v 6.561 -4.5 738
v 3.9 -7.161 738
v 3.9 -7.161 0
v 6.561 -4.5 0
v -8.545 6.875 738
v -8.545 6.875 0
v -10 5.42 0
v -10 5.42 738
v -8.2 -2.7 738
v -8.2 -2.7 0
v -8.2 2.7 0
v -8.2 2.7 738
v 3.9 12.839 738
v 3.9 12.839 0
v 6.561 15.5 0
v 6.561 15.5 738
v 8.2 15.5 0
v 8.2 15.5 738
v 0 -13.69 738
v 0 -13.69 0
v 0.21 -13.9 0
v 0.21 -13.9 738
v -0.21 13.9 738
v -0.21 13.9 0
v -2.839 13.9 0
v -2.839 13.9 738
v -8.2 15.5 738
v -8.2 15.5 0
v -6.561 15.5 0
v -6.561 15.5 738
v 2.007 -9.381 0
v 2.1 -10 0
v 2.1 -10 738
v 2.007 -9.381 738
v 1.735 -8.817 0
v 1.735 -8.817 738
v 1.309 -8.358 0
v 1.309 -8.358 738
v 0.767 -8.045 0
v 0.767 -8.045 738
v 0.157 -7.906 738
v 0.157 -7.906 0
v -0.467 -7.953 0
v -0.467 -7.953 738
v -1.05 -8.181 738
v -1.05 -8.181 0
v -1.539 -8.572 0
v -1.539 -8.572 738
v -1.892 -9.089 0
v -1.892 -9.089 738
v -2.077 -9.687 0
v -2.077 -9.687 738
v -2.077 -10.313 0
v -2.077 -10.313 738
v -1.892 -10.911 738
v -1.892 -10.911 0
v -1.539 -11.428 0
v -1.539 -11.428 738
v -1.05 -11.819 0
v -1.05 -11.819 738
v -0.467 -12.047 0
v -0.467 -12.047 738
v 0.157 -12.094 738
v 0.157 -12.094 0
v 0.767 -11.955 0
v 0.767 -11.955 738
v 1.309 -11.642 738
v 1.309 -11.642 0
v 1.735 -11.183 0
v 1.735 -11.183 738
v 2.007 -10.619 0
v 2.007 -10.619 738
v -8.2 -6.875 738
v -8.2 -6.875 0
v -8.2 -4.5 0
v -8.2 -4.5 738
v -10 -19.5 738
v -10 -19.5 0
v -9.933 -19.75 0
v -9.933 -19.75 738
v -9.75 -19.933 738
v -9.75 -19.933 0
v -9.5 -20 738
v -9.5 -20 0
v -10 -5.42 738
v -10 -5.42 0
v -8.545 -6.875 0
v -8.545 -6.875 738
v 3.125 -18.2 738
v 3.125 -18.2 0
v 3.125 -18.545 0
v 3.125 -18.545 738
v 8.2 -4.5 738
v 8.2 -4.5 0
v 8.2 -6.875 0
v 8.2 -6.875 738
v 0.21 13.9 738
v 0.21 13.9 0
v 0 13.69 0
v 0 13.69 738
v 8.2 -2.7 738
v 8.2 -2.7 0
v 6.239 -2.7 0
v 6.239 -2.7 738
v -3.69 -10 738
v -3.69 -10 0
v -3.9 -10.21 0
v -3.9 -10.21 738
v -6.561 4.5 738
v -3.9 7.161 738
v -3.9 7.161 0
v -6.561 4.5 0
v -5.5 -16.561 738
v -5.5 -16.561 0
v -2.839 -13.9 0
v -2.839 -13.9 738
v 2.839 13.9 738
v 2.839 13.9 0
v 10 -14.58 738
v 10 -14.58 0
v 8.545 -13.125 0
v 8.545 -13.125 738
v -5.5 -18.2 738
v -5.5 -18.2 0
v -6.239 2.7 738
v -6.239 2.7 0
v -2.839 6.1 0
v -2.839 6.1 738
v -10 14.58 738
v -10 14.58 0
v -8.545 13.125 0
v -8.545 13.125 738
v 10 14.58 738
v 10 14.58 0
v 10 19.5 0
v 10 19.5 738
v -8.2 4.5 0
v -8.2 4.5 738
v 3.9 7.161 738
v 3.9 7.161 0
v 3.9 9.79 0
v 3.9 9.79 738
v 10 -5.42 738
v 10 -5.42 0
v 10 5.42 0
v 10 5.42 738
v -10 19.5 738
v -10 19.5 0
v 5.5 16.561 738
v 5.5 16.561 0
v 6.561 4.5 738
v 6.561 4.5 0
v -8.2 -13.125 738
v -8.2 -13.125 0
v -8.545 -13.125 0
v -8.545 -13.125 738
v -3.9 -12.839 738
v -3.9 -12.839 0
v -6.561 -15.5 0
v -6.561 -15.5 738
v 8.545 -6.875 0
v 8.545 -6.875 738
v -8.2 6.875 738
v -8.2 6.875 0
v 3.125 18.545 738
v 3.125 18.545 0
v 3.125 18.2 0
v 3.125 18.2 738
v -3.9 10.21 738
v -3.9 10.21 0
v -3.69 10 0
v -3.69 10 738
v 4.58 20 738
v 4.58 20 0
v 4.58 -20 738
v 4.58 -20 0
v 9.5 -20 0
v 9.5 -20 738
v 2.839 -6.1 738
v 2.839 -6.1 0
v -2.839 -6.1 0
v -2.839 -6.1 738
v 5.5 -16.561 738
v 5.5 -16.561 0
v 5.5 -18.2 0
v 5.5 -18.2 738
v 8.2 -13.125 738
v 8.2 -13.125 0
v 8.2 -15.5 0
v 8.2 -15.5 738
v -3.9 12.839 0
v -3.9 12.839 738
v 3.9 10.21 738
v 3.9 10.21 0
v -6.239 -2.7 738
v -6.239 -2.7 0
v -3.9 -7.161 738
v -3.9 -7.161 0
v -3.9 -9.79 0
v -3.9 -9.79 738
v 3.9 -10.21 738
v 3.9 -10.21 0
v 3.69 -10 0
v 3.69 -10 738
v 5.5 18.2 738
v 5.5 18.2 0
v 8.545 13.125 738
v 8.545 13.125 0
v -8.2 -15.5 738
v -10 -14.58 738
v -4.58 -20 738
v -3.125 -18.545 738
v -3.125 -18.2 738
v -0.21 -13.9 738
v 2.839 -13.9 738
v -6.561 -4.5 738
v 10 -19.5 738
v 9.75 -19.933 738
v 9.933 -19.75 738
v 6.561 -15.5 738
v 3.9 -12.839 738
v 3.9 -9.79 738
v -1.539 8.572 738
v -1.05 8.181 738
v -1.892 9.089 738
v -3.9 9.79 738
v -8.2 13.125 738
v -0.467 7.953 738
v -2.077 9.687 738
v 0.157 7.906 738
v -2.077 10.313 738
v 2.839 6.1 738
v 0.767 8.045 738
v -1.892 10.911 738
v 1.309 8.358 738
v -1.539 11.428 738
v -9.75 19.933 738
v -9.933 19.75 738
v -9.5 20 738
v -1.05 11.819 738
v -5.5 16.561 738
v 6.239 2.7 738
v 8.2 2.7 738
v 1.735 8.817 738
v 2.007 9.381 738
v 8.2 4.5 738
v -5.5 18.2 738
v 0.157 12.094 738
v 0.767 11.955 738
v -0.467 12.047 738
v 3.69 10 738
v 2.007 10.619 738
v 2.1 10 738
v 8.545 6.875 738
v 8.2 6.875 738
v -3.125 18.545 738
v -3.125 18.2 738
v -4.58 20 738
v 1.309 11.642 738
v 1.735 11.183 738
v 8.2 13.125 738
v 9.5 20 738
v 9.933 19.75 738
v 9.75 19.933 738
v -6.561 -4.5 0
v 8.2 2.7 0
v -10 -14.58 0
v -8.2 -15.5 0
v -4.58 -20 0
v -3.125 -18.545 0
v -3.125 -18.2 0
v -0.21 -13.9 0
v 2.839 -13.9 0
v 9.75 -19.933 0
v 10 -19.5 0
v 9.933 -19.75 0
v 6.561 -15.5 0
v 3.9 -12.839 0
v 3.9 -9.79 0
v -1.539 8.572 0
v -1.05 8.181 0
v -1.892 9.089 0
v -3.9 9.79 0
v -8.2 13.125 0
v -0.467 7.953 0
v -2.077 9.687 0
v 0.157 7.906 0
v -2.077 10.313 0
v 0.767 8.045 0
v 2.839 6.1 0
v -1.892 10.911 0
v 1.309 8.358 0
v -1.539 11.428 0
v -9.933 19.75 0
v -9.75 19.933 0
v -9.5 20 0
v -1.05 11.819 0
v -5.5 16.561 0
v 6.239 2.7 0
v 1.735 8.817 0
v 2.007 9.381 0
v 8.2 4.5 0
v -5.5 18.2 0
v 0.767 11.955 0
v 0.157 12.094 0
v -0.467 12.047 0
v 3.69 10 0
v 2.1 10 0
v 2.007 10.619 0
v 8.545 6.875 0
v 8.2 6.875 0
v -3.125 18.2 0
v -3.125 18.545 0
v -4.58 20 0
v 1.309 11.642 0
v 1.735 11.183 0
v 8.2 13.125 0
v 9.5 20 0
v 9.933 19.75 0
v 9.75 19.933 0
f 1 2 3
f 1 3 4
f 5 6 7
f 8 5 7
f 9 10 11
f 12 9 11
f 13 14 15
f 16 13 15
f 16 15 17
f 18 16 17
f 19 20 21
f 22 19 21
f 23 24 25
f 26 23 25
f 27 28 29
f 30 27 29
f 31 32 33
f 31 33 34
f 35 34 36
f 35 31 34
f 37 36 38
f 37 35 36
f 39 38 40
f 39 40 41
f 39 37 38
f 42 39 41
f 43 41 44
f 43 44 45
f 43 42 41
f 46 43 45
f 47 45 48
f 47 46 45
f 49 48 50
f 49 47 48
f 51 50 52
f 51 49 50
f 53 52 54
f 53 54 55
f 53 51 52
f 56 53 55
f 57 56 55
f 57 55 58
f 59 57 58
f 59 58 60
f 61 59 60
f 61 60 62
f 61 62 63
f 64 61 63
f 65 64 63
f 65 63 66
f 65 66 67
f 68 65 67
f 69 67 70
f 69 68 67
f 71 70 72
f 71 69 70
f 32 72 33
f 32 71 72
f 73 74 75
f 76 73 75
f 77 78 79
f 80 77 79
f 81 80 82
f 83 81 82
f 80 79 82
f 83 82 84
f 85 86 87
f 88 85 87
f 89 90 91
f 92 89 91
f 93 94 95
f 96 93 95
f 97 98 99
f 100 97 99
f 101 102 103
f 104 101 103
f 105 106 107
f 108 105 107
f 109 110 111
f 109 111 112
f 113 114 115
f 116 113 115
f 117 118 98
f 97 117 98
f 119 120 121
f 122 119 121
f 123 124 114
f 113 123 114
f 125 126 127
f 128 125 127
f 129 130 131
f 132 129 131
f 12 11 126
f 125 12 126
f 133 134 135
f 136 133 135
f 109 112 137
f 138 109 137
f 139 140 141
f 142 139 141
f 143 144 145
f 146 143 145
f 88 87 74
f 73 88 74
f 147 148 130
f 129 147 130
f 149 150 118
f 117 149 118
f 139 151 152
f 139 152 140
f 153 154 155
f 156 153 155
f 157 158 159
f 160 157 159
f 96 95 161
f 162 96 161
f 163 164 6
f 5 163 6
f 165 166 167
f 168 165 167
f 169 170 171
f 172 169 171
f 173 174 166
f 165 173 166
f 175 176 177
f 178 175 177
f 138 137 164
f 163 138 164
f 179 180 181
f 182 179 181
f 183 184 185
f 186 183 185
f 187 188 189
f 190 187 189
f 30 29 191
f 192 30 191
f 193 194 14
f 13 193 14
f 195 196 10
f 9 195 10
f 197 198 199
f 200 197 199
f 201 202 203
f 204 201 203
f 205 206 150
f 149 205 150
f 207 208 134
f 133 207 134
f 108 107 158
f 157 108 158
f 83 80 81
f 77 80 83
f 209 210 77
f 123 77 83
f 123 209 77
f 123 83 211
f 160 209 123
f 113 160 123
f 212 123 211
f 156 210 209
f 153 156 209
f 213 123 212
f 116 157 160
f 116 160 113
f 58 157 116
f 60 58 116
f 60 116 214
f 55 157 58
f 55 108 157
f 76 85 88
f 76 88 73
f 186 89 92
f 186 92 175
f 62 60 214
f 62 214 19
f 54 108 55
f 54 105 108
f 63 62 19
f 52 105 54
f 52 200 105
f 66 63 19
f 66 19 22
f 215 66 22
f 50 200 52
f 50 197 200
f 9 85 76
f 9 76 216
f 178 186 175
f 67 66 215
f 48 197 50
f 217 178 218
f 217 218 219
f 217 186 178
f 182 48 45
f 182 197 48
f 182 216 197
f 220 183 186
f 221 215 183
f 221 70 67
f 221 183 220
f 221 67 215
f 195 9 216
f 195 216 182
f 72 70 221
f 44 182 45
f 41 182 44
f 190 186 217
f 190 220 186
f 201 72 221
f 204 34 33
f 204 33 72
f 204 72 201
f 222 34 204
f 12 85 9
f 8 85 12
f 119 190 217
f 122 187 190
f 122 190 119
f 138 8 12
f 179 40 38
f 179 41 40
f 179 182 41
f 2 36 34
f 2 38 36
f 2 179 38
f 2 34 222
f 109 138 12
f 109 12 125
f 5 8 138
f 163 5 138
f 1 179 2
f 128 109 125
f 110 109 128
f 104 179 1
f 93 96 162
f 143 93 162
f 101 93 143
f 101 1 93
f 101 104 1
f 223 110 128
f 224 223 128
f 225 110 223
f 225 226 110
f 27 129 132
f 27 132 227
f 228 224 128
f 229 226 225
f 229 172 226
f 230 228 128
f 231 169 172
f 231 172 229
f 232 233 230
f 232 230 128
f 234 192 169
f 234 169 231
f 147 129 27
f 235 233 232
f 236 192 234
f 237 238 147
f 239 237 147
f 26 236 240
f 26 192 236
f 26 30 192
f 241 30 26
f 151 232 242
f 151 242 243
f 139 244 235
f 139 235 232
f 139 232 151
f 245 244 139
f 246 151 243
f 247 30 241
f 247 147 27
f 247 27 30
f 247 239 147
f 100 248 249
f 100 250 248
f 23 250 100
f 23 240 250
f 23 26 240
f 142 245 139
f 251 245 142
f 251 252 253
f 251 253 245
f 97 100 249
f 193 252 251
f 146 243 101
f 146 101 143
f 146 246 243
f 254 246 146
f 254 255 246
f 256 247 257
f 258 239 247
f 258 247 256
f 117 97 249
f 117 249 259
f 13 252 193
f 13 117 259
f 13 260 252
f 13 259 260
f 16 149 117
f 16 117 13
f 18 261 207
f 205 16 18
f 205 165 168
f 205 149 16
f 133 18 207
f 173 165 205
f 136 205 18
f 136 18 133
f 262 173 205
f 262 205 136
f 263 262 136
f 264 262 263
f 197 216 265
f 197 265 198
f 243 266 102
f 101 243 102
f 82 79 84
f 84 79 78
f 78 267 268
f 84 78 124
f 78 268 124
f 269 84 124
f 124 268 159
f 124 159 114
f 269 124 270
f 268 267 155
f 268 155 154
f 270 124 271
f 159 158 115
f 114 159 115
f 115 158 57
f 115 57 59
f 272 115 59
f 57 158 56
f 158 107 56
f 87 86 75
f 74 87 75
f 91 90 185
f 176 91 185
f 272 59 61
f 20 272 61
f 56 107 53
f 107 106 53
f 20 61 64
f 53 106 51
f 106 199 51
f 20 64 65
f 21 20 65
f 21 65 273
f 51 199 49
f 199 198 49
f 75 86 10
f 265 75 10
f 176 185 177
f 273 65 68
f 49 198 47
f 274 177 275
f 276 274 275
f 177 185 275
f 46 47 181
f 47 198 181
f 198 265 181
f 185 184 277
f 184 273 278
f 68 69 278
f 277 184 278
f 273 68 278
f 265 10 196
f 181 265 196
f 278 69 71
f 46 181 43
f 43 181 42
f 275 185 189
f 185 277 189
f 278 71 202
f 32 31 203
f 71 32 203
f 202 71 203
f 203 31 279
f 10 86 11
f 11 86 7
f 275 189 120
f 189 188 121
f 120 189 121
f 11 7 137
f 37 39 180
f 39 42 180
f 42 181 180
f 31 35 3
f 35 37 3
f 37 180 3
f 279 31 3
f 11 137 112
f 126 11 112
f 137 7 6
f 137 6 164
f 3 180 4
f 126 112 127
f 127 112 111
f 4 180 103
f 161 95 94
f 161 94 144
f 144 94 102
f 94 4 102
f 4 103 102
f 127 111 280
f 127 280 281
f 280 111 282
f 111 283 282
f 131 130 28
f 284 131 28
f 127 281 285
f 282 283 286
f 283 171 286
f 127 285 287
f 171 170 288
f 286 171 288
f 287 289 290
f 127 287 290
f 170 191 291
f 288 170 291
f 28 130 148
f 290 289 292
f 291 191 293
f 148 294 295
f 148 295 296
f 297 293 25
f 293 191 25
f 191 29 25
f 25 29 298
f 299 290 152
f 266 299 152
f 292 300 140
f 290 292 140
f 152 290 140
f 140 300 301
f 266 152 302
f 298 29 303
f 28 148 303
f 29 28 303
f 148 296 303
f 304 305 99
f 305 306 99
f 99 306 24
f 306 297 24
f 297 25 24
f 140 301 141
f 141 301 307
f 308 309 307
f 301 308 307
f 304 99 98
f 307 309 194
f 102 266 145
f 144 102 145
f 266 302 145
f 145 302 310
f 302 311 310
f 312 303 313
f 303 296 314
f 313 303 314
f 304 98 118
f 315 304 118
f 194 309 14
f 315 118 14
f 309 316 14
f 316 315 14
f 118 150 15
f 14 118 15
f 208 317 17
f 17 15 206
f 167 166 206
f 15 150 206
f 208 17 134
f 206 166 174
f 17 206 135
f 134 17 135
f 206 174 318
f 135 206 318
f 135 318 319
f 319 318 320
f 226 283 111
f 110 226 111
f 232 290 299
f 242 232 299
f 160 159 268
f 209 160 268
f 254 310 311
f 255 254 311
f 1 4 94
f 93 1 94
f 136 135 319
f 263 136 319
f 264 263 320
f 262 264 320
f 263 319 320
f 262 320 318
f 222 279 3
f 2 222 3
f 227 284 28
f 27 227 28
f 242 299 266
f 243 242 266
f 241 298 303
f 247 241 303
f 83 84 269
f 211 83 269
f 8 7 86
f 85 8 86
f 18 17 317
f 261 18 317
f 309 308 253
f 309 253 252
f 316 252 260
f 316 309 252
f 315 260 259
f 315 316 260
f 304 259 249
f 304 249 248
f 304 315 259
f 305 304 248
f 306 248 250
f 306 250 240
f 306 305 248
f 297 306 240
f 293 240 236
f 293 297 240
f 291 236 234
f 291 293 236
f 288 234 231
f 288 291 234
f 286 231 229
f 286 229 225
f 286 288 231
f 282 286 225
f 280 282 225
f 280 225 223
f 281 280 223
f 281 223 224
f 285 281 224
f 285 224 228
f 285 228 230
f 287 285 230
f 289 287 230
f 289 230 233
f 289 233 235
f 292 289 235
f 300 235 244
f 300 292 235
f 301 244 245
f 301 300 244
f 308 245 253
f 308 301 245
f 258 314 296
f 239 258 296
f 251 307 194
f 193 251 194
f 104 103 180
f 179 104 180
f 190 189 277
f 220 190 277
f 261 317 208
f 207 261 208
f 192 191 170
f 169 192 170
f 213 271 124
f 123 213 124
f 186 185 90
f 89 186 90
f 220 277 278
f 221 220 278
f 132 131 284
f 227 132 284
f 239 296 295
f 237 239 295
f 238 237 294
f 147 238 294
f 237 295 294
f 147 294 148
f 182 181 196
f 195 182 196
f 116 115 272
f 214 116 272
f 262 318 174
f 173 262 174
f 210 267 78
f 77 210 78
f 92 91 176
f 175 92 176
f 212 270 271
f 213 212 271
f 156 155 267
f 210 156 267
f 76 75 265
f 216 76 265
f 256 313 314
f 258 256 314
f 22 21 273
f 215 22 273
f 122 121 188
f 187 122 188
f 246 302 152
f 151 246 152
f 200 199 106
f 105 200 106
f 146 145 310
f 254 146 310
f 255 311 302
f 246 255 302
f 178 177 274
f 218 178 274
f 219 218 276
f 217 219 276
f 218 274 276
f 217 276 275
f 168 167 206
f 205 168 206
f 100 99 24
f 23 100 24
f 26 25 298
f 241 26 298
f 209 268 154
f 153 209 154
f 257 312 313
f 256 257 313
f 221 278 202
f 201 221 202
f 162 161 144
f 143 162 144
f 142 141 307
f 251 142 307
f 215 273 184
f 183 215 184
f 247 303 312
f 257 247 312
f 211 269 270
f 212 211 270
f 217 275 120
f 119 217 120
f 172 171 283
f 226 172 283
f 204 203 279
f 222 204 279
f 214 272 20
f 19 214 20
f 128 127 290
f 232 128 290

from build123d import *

# Parameters (mm, degrees)
SKETCH1_R           = 2.1
BOSS_EXTRUDE1_DEPTH = 738


with BuildPart() as part:
    # Sketch1 → Boss-Extrude1 (new body)
    with BuildSketch(Plane.XY):
        with BuildLine():
            Line((4.58, -20), (9.5, -20))
            ThreePointArc((9.5, -20), (9.853553391, -19.853553391), (10, -19.5))
            Line((10, -19.5), (10, -14.58))
            Line((10, -14.58), (8.545, -13.125))
            Line((8.545, -13.125), (8.2, -13.125))
            Line((8.2, -13.125), (8.2, -15.5))
            Line((8.2, -15.5), (6.560660172, -15.5))
            Line((6.560660172, -15.5), (3.9, -12.839339828))
            Line((3.9, -12.839339828), (3.9, -10.21))
            Line((3.9, -10.21), (3.69, -10))
            Line((3.69, -10), (3.9, -9.79))
            Line((3.9, -9.79), (3.9, -7.160660172))
            Line((3.9, -7.160660172), (6.560660172, -4.5))
            Line((6.560660172, -4.5), (8.2, -4.5))
            Line((8.2, -4.5), (8.2, -6.875))
            Line((8.2, -6.875), (8.545, -6.875))
            Line((8.545, -6.875), (10, -5.42))
            Line((10, -5.42), (10, 5.42))
            Line((10, 5.42), (8.545, 6.875))
            Line((8.545, 6.875), (8.2, 6.875))
            Line((8.2, 6.875), (8.2, 4.5))
            Line((8.2, 4.5), (6.560660172, 4.5))
            Line((6.560660172, 4.5), (3.9, 7.160660172))
            Line((3.9, 7.160660172), (3.9, 9.79))
            Line((3.9, 9.79), (3.69, 10))
            Line((3.69, 10), (3.9, 10.21))
            Line((3.9, 10.21), (3.9, 12.839339828))
            Line((3.9, 12.839339828), (6.560660172, 15.5))
            Line((6.560660172, 15.5), (8.2, 15.5))
            Line((8.2, 15.5), (8.2, 13.125))
            Line((8.2, 13.125), (8.545, 13.125))
            Line((8.545, 13.125), (10, 14.58))
            Line((10, 14.58), (10, 19.5))
            ThreePointArc((10, 19.5), (9.853553391, 19.853553391), (9.5, 20))
            Line((9.5, 20), (4.58, 20))
            Line((4.58, 20), (3.125, 18.545))
            Line((3.125, 18.545), (3.125, 18.2))
            Line((3.125, 18.2), (5.5, 18.2))
            Line((5.5, 18.2), (5.5, 16.560660172))
            Line((5.5, 16.560660172), (2.839339828, 13.9))
            Line((2.839339828, 13.9), (0.21, 13.9))
            Line((0.21, 13.9), (0, 13.69))
            Line((0, 13.69), (-0.21, 13.9))
            Line((-0.21, 13.9), (-2.839339828, 13.9))
            Line((-2.839339828, 13.9), (-5.5, 16.560660172))
            Line((-5.5, 16.560660172), (-5.5, 18.2))
            Line((-5.5, 18.2), (-3.125, 18.2))
            Line((-3.125, 18.2), (-3.125, 18.545))
            Line((-3.125, 18.545), (-4.58, 20))
            Line((-4.58, 20), (-9.5, 20))
            ThreePointArc((-9.5, 20), (-9.853553391, 19.853553391), (-10, 19.5))
            Line((-10, 19.5), (-10, 14.58))
            Line((-10, 14.58), (-8.545, 13.125))
            Line((-8.545, 13.125), (-8.2, 13.125))
            Line((-8.2, 13.125), (-8.2, 15.5))
            Line((-8.2, 15.5), (-6.560660172, 15.5))
            Line((-6.560660172, 15.5), (-3.9, 12.839339828))
            Line((-3.9, 12.839339828), (-3.9, 10.21))
            Line((-3.9, 10.21), (-3.69, 10))
            Line((-3.69, 10), (-3.9, 9.79))
            Line((-3.9, 9.79), (-3.9, 7.160660172))
            Line((-3.9, 7.160660172), (-6.560660172, 4.5))
            Line((-6.560660172, 4.5), (-8.2, 4.5))
            Line((-8.2, 4.5), (-8.2, 6.875))
            Line((-8.2, 6.875), (-8.545, 6.875))
            Line((-8.545, 6.875), (-10, 5.42))
            Line((-10, 5.42), (-10, -5.42))
            Line((-10, -5.42), (-8.545, -6.875))
            Line((-8.545, -6.875), (-8.2, -6.875))
            Line((-8.2, -6.875), (-8.2, -4.5))
            Line((-8.2, -4.5), (-6.560660172, -4.5))
            Line((-6.560660172, -4.5), (-3.9, -7.160660172))
            Line((-3.9, -7.160660172), (-3.9, -9.79))
            Line((-3.9, -9.79), (-3.69, -10))
            Line((-3.69, -10), (-3.9, -10.21))
            Line((-3.9, -10.21), (-3.9, -12.839339828))
            Line((-3.9, -12.839339828), (-6.560660172, -15.5))
            Line((-6.560660172, -15.5), (-8.2, -15.5))
            Line((-8.2, -15.5), (-8.2, -13.125))
            Line((-8.2, -13.125), (-8.545, -13.125))
            Line((-8.545, -13.125), (-10, -14.58))
            Line((-10, -14.58), (-10, -19.5))
            ThreePointArc((-10, -19.5), (-9.853553391, -19.853553391), (-9.5, -20))
            Line((-9.5, -20), (-4.58, -20))
            Line((-4.58, -20), (-3.125, -18.545))
            Line((-3.125, -18.545), (-3.125, -18.2))
            Line((-3.125, -18.2), (-5.5, -18.2))
            Line((-5.5, -18.2), (-5.5, -16.560660172))
            Line((-5.5, -16.560660172), (-2.839339828, -13.9))
            Line((-2.839339828, -13.9), (-0.21, -13.9))
            Line((-0.21, -13.9), (0, -13.69))
            Line((0, -13.69), (0.21, -13.9))
            Line((0.21, -13.9), (2.839339828, -13.9))
            Line((2.839339828, -13.9), (5.5, -16.560660172))
            Line((5.5, -16.560660172), (5.5, -18.2))
            Line((5.5, -18.2), (3.125, -18.2))
            Line((3.125, -18.2), (3.125, -18.545))
            Line((3.125, -18.545), (4.58, -20))
        make_face()
        with Locations((0, -10)):
            Circle(SKETCH1_R, mode=Mode.SUBTRACT)
        Polygon((-6.239339828, -2.7), (-8.2, -2.7), (-8.2, 2.7), (-6.239339828, 2.7), (-2.839339828, 6.1), (2.839339828, 6.1), (6.239339828, 2.7), (8.2, 2.7), (8.2, -2.7), (6.239339828, -2.7), (2.839339828, -6.1), (-2.839339828, -6.1), align=None, mode=Mode.SUBTRACT)
        with Locations((0, 10)):
            Circle(SKETCH1_R, mode=Mode.SUBTRACT)
    extrude(amount=BOSS_EXTRUDE1_DEPTH)


solid = part.part
